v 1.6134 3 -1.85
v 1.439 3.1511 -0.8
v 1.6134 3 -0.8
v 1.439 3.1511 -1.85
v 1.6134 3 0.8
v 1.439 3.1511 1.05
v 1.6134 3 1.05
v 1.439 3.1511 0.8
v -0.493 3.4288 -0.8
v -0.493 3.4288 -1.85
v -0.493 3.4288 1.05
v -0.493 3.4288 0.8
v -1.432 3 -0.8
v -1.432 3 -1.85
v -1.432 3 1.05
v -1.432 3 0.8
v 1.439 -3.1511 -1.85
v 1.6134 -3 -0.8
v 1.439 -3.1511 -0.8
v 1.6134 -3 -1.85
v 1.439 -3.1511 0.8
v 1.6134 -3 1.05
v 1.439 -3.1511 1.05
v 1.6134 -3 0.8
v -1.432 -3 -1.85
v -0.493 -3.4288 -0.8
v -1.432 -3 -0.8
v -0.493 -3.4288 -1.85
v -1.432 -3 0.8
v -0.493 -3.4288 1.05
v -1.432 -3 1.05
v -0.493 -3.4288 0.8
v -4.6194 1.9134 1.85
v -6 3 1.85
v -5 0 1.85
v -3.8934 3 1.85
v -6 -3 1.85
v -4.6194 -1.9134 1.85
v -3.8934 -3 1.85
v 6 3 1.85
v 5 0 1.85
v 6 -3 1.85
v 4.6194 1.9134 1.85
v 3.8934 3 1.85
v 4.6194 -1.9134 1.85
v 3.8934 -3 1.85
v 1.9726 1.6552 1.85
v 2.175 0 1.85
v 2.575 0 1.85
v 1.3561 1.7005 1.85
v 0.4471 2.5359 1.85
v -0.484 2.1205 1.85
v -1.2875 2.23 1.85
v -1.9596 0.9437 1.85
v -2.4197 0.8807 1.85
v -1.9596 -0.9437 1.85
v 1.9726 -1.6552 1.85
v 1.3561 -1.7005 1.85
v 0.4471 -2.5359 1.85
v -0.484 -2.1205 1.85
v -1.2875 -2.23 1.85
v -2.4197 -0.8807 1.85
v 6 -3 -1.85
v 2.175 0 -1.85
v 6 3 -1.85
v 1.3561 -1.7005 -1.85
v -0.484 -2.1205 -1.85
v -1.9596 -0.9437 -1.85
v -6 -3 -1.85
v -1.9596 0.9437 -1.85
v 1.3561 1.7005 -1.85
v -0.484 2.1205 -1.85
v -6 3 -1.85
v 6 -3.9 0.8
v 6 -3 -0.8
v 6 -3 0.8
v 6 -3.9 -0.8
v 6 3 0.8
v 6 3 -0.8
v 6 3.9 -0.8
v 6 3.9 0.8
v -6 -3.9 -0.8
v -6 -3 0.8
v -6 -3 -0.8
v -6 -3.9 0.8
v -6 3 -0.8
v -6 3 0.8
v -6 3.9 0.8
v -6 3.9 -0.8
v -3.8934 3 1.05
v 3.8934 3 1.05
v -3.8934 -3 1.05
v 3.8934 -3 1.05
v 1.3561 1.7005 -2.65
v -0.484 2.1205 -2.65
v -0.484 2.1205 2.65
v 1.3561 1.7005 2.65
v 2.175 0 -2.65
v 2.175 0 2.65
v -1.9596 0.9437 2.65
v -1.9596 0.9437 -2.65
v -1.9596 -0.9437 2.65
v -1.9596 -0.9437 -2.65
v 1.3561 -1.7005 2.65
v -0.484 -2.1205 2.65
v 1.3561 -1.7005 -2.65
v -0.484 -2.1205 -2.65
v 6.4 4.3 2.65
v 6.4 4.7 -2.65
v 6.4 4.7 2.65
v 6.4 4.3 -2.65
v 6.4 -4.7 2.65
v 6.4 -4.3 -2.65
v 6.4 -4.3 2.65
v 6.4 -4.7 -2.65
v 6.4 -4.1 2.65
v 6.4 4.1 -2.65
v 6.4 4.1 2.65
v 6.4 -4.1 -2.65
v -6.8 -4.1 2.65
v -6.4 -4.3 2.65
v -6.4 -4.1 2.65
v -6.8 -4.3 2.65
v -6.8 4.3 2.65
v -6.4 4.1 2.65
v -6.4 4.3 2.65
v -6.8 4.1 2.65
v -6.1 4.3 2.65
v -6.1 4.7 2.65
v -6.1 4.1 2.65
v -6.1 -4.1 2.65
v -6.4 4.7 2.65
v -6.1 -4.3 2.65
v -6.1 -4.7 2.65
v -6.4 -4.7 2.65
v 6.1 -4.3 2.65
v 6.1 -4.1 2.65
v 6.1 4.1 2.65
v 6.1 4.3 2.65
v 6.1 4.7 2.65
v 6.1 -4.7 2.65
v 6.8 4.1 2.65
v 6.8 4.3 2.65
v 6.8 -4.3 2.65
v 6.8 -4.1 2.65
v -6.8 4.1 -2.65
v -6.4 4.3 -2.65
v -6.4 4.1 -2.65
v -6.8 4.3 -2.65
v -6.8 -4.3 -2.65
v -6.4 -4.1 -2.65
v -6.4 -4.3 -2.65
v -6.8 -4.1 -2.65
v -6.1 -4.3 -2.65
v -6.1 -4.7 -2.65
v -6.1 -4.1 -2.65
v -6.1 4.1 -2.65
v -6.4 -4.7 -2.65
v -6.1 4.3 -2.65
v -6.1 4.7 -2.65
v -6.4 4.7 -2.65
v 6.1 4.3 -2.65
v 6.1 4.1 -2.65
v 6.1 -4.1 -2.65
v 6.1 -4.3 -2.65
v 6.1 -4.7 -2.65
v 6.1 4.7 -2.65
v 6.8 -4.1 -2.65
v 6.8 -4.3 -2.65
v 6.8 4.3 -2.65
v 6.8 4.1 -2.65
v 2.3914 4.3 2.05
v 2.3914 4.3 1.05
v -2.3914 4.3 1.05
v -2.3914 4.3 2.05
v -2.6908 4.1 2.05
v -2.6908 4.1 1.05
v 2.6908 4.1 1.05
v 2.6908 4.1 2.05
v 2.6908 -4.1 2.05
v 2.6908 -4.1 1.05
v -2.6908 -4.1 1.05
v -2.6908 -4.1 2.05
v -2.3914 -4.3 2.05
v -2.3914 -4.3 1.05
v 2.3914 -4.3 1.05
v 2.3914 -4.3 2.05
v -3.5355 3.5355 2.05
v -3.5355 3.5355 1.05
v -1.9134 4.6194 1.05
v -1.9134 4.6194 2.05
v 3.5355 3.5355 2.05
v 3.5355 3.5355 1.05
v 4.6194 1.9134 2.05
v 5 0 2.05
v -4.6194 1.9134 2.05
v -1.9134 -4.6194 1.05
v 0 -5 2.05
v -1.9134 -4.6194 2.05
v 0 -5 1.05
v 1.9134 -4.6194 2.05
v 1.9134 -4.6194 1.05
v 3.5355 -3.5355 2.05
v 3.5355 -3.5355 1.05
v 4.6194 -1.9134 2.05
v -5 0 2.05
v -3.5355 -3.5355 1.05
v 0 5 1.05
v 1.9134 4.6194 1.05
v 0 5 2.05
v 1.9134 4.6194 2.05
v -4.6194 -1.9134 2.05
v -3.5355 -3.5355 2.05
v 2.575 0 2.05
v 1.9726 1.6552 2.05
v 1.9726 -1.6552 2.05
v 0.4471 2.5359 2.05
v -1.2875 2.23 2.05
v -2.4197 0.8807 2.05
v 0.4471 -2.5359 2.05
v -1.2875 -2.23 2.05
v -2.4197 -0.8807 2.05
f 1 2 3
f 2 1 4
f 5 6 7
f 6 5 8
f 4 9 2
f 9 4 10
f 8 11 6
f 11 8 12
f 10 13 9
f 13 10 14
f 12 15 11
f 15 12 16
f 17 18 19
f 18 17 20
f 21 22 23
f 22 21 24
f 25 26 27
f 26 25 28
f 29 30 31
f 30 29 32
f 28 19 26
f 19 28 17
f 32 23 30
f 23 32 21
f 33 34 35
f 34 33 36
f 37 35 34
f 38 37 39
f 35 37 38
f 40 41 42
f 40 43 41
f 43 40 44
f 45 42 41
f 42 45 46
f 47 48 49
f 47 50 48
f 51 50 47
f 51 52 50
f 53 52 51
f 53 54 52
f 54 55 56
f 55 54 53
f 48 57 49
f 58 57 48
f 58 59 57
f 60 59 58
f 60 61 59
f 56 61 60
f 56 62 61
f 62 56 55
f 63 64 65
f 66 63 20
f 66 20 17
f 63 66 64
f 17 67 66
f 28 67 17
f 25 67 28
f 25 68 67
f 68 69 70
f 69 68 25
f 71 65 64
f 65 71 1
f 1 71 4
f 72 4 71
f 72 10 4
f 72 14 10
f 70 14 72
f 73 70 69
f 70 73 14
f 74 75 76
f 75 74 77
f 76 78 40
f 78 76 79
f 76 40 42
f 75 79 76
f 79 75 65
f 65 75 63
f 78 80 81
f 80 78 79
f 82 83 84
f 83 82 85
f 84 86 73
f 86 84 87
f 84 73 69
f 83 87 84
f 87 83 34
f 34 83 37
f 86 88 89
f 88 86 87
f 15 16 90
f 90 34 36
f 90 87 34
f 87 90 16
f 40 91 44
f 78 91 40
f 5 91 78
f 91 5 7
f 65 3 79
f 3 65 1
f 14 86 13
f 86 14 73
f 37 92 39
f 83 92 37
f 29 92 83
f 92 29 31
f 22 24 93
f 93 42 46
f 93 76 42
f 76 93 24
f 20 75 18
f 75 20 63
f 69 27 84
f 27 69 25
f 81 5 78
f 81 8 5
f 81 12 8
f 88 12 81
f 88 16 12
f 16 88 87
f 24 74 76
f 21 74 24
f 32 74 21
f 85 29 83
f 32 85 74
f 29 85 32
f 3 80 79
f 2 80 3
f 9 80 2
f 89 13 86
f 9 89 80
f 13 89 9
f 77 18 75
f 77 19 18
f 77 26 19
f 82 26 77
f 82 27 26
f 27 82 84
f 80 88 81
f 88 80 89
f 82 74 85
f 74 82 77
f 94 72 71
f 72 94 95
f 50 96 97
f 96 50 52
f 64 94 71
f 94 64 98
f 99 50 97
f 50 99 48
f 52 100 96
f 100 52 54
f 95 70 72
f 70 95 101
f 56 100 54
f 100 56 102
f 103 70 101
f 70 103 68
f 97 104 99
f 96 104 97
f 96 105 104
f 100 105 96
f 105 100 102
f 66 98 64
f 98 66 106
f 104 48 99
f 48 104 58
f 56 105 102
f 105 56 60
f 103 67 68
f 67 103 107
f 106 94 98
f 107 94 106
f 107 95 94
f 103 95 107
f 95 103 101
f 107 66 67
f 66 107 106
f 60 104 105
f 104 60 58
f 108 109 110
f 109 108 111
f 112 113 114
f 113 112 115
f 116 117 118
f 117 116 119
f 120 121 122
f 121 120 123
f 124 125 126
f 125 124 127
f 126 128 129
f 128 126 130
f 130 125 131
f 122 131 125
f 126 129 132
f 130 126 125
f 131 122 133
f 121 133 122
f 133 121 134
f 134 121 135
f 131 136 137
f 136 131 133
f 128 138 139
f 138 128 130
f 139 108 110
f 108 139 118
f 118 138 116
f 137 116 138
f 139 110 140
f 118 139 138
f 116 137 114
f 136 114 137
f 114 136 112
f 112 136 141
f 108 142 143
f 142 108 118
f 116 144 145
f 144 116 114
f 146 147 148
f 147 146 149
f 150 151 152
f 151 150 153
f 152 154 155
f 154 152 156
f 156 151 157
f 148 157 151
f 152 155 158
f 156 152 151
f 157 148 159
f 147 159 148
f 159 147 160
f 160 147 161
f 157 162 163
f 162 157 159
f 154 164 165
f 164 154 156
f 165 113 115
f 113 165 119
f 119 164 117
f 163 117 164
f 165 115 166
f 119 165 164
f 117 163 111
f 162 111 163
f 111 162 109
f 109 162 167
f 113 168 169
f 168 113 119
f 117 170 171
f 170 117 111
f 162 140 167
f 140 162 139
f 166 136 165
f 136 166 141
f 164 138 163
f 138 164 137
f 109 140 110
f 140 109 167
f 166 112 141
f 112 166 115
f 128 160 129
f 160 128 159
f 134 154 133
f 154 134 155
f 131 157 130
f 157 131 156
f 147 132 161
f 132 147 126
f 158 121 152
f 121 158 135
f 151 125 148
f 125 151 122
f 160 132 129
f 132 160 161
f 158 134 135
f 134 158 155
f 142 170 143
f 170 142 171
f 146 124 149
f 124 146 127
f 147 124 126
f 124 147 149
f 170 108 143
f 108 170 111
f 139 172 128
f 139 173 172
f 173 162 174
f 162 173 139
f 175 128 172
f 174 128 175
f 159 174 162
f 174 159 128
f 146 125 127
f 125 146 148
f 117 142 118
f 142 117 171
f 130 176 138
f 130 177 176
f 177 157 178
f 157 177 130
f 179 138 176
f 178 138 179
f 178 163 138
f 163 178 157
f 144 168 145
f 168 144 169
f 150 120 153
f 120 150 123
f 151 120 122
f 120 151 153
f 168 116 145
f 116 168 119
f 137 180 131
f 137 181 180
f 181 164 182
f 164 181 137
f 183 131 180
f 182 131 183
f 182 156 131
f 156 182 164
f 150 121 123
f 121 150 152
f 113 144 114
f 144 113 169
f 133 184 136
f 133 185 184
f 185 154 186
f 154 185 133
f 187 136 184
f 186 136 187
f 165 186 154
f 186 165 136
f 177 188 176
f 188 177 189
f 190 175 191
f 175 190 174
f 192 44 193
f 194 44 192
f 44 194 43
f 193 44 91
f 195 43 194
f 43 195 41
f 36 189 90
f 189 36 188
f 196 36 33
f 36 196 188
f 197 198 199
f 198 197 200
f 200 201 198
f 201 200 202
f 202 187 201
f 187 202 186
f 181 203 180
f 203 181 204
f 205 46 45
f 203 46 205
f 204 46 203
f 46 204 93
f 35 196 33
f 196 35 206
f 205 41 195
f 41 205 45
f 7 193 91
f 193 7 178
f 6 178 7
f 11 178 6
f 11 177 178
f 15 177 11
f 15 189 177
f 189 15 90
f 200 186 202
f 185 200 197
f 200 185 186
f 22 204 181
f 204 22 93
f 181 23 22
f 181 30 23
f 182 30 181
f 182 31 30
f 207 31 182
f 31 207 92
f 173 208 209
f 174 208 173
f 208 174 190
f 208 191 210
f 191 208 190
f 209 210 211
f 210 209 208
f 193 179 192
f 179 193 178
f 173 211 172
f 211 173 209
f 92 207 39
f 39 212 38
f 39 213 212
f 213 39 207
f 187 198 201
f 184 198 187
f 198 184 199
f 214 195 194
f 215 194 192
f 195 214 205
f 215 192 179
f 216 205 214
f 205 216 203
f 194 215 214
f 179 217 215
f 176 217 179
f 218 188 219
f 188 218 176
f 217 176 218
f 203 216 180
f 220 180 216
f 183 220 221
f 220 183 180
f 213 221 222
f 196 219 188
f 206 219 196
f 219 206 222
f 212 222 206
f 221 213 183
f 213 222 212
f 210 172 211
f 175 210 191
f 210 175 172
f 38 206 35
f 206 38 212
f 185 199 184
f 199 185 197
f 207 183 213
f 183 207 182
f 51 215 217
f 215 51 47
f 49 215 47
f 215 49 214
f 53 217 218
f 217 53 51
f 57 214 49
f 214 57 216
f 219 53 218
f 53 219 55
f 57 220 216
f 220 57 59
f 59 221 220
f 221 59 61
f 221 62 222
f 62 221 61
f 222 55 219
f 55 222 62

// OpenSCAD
// Parameters
screw_thread_diameter_mm = 5.0; //[2.5:10.0:0.1]
screw_thread_pitch_mm = 0.8; //[0.4:1.6:0.05]
across_flats_mm = 6.0; //[3.0:12.0:0.1]
thickness_mm = 3.7; //[1.8:7.4:0.1]
threaded_hole_tap_drill_diameter_mm = 4.2; //[3.0:6.0:0.05]
thread_clearance_allowance_mm = 0.15; //[0.0:0.5:0.01]
t_slot_nominal_width_mm = 8.0; //[4.0:16.0:0.1]
t_slot_neck_width_mm = 6.0; //[3.0:12.0:0.1]
t_slot_depth_mm = 6.0; //[3.0:12.0:0.1]
overall_length_mm = 12.0; //[6.0:24.0:0.1]
overall_width_mm = 7.8; //[4.0:16.0:0.1]
shoulder_height_mm = 0.8; //[0.3:2.0:0.05]
shoulder_width_mm = 0.9; //[0.3:2.5:0.05]
chamfer_mm = 0.3; //[0.0:1.0:0.05]
fillet_radius_mm = 0.2; //[0.0:1.0:0.05]
overlap_mm = 0.8; //[0.2:2.0:0.1]
washer_outer_diameter_mm = 10.0; //[6.0:20.0:0.1]
washer_thickness_mm = 1.0; //[0.5:2.5:0.1]
assembly_gap_mm = 0.6; //[0.0:3.0:0.1]

// Nut and Washer - complete geometry
module nut_and_washer() {
  color("DimGray") {
    // Hex outer profile
    cylinder(r=across_flats_mm/(2*cos(30)), h=thickness_mm, center=true);

    // T-slot nut body block
    translate([0, 0, 0])
      cube([overall_length_mm, t_slot_neck_width_mm, thickness_mm], center=true);

    // T-slot retention shoulders
    translate([0, 0, 0])
      cube([overall_length_mm, t_slot_neck_width_mm + 2*shoulder_width_mm, 2*shoulder_height_mm], center=true);

    // Threaded through hole
    translate([0, 0, 0])
      cylinder(r=(threaded_hole_tap_drill_diameter_mm + thread_clearance_allowance_mm)/2, h=thickness_mm + 2*overlap_mm, center=true);

    // Lead-in chamfer wedges
    translate([overall_length_mm/2 - chamfer_mm/2 + overlap_mm/2, 0, 0])
      cube([chamfer_mm, overall_width_mm + 2*overlap_mm, thickness_mm + 2*overlap_mm], center=true);
    translate([-overall_length_mm/2 + chamfer_mm/2 - overlap_mm/2, 0, 0])
      cube([chamfer_mm, overall_width_mm + 2*overlap_mm, thickness_mm + 2*overlap_mm], center=true);

    // Edge chamfer wedges
    translate([0, overall_width_mm/2 - fillet_radius_mm/2 + overlap_mm/2, 0])
      cube([overall_length_mm + 2*overlap_mm, fillet_radius_mm, thickness_mm + 2*overlap_mm], center=true);
    translate([0, -overall_width_mm/2 + fillet_radius_mm/2 - overlap_mm/2, 0])
      cube([overall_length_mm + 2*overlap_mm, fillet_radius_mm, thickness_mm + 2*overlap_mm], center=true);
  }

  // Washer
  color("Silver") {
    translate([0, 0, thickness_mm/2 + washer_thickness_mm/2 - overlap_mm])
      difference() {
        cylinder(r=washer_outer_diameter_mm/2, h=washer_thickness_mm, center=true);
        cylinder(r=(screw_thread_diameter_mm + thread_clearance_allowance_mm)/2, h=washer_thickness_mm + 2*overlap_mm, center=true);
      }
  }
}

// Assembly
module assembly() {
  nut_and_washer();
}

assembly();
